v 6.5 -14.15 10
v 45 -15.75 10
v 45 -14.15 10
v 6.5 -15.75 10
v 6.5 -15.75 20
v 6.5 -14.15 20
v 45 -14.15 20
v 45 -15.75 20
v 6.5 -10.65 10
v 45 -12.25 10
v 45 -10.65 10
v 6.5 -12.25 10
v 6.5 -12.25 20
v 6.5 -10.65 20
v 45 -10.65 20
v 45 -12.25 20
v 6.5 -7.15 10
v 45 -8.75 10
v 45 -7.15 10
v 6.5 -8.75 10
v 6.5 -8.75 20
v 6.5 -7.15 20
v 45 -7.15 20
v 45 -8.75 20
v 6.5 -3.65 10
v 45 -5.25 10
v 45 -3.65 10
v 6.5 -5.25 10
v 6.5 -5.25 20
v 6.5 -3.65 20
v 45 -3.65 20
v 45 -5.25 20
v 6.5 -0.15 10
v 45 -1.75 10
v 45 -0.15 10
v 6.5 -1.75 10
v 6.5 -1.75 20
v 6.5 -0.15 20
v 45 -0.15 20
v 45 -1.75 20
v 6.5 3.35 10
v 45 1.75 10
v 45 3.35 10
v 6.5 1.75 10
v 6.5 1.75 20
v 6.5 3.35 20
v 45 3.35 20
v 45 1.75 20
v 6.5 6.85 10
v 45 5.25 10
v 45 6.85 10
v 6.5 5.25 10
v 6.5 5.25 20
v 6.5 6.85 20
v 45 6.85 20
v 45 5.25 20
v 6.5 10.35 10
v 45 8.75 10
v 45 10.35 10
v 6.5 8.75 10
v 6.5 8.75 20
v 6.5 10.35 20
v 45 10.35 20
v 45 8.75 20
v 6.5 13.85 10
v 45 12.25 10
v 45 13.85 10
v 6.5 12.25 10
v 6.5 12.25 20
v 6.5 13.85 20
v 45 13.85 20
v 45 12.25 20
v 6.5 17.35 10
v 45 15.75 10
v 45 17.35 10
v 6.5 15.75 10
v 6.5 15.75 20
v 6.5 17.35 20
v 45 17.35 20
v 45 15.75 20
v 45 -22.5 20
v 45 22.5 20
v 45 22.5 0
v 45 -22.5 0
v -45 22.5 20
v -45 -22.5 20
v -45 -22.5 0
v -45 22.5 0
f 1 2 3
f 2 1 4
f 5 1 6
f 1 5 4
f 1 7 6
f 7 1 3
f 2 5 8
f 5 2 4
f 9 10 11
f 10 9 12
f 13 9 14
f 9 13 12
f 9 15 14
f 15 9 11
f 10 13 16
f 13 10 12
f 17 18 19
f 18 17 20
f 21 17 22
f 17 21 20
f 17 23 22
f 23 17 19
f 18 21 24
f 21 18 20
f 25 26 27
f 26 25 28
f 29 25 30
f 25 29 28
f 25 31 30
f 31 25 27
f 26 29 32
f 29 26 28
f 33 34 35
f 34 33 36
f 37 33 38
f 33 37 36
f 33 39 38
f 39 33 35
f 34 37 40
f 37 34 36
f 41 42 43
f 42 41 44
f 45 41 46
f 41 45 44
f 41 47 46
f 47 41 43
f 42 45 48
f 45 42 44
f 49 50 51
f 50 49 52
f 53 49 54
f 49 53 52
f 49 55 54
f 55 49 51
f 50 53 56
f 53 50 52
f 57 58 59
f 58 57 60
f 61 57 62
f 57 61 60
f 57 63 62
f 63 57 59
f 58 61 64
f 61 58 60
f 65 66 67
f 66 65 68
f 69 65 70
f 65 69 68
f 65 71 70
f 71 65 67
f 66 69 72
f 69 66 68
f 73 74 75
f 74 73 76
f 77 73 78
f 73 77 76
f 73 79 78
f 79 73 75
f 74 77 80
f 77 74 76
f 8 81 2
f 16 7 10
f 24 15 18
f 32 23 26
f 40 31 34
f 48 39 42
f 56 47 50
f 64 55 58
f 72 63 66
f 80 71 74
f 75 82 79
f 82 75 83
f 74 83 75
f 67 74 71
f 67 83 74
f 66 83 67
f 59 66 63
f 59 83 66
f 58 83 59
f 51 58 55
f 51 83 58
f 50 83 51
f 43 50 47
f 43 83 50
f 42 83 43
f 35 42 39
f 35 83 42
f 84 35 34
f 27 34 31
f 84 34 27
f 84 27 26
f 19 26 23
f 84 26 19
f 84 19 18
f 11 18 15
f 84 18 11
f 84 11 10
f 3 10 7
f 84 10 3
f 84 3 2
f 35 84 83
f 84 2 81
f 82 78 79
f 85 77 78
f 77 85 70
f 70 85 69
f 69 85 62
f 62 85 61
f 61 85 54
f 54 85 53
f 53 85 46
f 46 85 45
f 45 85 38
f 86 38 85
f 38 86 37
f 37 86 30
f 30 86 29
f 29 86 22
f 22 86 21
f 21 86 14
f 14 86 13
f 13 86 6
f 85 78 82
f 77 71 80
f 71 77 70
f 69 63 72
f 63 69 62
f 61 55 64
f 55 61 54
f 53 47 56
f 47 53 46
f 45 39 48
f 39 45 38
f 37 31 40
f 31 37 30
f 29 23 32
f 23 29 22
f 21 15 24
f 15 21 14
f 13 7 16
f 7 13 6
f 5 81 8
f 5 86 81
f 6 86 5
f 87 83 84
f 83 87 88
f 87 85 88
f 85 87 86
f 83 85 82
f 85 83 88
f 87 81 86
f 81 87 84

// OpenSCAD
// Microscope slide drying rack
// Print orientation: base on XY plane, slots open upward (+Z)

// ---------- Block ----------
block_l = 90;      // block length along X (mm)
block_w = 45;      // block width along Y (mm)
block_h = 20;      // block height along Z (mm)

// ---------- Slots ----------
slot_n     = 10;   // number of slide slots
slot_len   = 77;   // slot length along X (mm)
slot_w     = 1.6;  // slot width along Y (mm)
slot_d     = 10;   // slot depth from top face (mm)
slot_pitch = 3.5;  // centre-to-centre spacing along Y (mm)

// ---------- Misc ----------
eps = 0.5;         // overcut past faces to avoid coplanar surfaces
$fn = 64;

// Derived
slot_x0 = -(slot_len - block_l) / 2;              // first slot start X
slot_y0 = -(slot_n - 1) * slot_pitch / 2;         // first slot centre Y

difference() {
    // Base block
    translate([-block_l / 2, -block_w / 2, 0])
        cube([block_l, block_w, block_h]);

    // Parallel slots, open at the top
    for (i = [0 : slot_n - 1]) {
        translate([slot_x0, slot_y0 + i * slot_pitch, block_h - slot_d])
            cube([slot_len, slot_w, slot_d + eps]);
    }
}
